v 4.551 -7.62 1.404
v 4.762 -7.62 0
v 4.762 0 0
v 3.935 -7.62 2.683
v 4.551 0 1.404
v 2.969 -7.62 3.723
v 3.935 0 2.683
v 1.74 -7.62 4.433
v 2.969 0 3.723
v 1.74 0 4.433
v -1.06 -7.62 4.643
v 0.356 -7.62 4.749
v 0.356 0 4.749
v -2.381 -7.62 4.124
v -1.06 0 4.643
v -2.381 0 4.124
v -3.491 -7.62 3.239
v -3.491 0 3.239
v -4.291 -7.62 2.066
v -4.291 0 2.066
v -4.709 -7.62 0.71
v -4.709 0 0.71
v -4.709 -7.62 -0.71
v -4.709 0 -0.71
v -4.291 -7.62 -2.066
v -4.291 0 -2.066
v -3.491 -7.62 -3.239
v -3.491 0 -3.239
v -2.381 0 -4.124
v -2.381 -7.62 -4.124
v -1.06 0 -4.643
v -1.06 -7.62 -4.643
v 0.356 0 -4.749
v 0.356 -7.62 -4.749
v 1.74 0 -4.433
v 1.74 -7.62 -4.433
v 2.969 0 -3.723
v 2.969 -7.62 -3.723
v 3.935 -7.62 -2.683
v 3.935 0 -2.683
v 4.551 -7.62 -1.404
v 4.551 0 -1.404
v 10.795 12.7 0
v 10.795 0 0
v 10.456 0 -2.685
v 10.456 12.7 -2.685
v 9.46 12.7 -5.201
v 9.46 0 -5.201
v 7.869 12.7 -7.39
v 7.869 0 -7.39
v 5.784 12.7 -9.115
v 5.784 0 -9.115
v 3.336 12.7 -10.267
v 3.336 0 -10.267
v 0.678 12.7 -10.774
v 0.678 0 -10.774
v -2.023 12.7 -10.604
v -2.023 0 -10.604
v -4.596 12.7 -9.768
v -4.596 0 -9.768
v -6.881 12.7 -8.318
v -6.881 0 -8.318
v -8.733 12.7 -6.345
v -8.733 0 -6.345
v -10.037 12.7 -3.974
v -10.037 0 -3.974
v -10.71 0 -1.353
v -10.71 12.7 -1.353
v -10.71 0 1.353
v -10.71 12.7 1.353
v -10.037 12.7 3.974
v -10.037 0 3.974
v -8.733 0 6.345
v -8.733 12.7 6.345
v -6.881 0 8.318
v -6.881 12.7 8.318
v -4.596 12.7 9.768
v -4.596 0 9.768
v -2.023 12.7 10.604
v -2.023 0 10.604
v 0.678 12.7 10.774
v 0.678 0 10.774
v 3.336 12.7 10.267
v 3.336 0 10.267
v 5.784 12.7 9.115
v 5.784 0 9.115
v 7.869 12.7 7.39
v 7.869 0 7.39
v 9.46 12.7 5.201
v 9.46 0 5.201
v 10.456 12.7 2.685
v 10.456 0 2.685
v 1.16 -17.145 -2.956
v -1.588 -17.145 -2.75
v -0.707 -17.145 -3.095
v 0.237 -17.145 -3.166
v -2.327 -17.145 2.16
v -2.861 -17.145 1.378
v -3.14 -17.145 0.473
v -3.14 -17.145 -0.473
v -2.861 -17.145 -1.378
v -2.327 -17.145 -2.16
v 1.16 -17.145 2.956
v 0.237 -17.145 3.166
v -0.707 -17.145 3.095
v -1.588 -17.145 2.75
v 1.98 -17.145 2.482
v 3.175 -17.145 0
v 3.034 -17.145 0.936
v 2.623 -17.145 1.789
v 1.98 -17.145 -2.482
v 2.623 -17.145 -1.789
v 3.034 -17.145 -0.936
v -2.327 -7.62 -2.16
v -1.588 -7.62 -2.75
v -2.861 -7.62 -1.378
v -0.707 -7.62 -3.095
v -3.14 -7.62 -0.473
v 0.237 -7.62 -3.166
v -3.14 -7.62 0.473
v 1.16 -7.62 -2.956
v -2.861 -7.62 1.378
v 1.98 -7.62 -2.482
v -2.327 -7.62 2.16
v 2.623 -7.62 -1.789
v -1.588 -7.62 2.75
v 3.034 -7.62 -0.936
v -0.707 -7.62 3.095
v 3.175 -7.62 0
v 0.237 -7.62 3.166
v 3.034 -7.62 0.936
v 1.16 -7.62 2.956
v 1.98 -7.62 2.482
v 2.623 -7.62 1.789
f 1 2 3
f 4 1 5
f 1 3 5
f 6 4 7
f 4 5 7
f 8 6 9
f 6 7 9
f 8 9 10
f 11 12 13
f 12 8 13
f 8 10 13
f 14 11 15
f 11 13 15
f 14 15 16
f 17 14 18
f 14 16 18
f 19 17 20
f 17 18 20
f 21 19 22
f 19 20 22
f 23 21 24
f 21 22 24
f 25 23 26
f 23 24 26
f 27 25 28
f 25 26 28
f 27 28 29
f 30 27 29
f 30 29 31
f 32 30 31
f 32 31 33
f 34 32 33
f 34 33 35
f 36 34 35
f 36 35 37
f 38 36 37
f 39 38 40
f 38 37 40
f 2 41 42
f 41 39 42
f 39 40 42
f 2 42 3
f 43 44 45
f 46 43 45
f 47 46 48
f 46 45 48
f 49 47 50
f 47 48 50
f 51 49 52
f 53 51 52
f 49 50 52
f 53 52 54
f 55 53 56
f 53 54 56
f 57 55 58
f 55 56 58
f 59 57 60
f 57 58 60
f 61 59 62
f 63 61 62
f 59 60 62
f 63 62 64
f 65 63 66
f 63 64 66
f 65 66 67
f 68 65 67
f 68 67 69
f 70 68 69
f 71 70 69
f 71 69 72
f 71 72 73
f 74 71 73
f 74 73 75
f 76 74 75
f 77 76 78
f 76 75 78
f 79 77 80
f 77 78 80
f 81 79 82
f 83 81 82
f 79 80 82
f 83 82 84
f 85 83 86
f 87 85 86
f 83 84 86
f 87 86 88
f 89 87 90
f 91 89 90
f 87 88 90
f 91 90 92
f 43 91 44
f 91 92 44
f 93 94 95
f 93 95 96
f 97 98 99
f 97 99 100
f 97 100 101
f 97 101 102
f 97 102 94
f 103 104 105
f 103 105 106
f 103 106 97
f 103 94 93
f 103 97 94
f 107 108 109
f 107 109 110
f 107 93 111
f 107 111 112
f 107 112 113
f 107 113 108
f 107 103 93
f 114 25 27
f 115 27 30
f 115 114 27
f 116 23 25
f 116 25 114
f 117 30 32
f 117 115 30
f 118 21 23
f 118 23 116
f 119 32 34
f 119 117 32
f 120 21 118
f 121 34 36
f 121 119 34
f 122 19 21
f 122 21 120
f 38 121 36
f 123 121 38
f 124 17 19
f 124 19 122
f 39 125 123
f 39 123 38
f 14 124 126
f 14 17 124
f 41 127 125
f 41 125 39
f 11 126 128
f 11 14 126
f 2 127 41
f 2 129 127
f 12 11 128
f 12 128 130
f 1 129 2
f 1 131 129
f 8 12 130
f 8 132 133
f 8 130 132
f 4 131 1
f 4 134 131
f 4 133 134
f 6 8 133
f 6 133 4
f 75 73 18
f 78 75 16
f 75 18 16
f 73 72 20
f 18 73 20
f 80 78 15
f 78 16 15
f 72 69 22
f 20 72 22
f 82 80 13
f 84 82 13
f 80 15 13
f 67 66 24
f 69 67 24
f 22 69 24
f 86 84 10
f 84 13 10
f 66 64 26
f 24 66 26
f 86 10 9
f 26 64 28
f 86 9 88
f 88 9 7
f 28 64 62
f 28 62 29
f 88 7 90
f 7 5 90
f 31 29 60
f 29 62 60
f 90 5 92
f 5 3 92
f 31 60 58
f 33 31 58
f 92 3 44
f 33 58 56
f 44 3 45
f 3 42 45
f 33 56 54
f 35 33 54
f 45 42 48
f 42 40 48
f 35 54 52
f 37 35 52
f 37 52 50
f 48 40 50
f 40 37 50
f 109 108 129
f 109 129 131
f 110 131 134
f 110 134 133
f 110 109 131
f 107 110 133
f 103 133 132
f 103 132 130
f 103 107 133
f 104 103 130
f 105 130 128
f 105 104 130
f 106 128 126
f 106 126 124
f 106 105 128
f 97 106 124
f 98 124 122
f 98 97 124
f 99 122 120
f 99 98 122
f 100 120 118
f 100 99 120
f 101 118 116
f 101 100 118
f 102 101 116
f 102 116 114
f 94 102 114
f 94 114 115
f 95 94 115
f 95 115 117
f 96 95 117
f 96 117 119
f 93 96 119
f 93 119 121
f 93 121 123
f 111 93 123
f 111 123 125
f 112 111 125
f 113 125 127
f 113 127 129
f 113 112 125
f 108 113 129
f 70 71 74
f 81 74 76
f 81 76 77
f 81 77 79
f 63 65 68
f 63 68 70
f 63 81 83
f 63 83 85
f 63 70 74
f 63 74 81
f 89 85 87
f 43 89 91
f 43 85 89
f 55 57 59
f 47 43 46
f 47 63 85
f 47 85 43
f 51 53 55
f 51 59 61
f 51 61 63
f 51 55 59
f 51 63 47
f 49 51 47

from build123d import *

# Parameters (mm, degrees)
SKETCH1_R           = 10.795
BOSS_EXTRUDE1_DEPTH = 12.7
SKETCH2_R           = 4.7625
BOSS_EXTRUDE2_DEPTH = 17.145
SKETCH3_OUTSIDE_W   = 32.13
SKETCH3_OUTSIDE_H   = 32.13
SKETCH3_OUTSIDE_R   = 3.175
CUT_EXTRUDE1_DEPTH  = 9.525


with BuildPart() as part:
    # Sketch1 → Boss-Extrude1 (new body)
    with BuildSketch(Plane(origin=(0, 0, 0), x_dir=(1, 0, 0), z_dir=(0, 1, 0))):
        Circle(SKETCH1_R)
    extrude(amount=BOSS_EXTRUDE1_DEPTH)

    # Sketch2 → Boss-Extrude2 (add)
    with BuildSketch(Plane.XZ):
        Circle(SKETCH2_R)
    extrude(amount=BOSS_EXTRUDE2_DEPTH)

    # Sketch3 outside → Cut-Extrude1 (cut)
    with BuildSketch(Plane.XZ.offset(17.145)):
        Rectangle(SKETCH3_OUTSIDE_W, SKETCH3_OUTSIDE_H)
        Circle(SKETCH3_OUTSIDE_R, mode=Mode.SUBTRACT)
    extrude(amount=-CUT_EXTRUDE1_DEPTH, mode=Mode.SUBTRACT)


solid = part.part
